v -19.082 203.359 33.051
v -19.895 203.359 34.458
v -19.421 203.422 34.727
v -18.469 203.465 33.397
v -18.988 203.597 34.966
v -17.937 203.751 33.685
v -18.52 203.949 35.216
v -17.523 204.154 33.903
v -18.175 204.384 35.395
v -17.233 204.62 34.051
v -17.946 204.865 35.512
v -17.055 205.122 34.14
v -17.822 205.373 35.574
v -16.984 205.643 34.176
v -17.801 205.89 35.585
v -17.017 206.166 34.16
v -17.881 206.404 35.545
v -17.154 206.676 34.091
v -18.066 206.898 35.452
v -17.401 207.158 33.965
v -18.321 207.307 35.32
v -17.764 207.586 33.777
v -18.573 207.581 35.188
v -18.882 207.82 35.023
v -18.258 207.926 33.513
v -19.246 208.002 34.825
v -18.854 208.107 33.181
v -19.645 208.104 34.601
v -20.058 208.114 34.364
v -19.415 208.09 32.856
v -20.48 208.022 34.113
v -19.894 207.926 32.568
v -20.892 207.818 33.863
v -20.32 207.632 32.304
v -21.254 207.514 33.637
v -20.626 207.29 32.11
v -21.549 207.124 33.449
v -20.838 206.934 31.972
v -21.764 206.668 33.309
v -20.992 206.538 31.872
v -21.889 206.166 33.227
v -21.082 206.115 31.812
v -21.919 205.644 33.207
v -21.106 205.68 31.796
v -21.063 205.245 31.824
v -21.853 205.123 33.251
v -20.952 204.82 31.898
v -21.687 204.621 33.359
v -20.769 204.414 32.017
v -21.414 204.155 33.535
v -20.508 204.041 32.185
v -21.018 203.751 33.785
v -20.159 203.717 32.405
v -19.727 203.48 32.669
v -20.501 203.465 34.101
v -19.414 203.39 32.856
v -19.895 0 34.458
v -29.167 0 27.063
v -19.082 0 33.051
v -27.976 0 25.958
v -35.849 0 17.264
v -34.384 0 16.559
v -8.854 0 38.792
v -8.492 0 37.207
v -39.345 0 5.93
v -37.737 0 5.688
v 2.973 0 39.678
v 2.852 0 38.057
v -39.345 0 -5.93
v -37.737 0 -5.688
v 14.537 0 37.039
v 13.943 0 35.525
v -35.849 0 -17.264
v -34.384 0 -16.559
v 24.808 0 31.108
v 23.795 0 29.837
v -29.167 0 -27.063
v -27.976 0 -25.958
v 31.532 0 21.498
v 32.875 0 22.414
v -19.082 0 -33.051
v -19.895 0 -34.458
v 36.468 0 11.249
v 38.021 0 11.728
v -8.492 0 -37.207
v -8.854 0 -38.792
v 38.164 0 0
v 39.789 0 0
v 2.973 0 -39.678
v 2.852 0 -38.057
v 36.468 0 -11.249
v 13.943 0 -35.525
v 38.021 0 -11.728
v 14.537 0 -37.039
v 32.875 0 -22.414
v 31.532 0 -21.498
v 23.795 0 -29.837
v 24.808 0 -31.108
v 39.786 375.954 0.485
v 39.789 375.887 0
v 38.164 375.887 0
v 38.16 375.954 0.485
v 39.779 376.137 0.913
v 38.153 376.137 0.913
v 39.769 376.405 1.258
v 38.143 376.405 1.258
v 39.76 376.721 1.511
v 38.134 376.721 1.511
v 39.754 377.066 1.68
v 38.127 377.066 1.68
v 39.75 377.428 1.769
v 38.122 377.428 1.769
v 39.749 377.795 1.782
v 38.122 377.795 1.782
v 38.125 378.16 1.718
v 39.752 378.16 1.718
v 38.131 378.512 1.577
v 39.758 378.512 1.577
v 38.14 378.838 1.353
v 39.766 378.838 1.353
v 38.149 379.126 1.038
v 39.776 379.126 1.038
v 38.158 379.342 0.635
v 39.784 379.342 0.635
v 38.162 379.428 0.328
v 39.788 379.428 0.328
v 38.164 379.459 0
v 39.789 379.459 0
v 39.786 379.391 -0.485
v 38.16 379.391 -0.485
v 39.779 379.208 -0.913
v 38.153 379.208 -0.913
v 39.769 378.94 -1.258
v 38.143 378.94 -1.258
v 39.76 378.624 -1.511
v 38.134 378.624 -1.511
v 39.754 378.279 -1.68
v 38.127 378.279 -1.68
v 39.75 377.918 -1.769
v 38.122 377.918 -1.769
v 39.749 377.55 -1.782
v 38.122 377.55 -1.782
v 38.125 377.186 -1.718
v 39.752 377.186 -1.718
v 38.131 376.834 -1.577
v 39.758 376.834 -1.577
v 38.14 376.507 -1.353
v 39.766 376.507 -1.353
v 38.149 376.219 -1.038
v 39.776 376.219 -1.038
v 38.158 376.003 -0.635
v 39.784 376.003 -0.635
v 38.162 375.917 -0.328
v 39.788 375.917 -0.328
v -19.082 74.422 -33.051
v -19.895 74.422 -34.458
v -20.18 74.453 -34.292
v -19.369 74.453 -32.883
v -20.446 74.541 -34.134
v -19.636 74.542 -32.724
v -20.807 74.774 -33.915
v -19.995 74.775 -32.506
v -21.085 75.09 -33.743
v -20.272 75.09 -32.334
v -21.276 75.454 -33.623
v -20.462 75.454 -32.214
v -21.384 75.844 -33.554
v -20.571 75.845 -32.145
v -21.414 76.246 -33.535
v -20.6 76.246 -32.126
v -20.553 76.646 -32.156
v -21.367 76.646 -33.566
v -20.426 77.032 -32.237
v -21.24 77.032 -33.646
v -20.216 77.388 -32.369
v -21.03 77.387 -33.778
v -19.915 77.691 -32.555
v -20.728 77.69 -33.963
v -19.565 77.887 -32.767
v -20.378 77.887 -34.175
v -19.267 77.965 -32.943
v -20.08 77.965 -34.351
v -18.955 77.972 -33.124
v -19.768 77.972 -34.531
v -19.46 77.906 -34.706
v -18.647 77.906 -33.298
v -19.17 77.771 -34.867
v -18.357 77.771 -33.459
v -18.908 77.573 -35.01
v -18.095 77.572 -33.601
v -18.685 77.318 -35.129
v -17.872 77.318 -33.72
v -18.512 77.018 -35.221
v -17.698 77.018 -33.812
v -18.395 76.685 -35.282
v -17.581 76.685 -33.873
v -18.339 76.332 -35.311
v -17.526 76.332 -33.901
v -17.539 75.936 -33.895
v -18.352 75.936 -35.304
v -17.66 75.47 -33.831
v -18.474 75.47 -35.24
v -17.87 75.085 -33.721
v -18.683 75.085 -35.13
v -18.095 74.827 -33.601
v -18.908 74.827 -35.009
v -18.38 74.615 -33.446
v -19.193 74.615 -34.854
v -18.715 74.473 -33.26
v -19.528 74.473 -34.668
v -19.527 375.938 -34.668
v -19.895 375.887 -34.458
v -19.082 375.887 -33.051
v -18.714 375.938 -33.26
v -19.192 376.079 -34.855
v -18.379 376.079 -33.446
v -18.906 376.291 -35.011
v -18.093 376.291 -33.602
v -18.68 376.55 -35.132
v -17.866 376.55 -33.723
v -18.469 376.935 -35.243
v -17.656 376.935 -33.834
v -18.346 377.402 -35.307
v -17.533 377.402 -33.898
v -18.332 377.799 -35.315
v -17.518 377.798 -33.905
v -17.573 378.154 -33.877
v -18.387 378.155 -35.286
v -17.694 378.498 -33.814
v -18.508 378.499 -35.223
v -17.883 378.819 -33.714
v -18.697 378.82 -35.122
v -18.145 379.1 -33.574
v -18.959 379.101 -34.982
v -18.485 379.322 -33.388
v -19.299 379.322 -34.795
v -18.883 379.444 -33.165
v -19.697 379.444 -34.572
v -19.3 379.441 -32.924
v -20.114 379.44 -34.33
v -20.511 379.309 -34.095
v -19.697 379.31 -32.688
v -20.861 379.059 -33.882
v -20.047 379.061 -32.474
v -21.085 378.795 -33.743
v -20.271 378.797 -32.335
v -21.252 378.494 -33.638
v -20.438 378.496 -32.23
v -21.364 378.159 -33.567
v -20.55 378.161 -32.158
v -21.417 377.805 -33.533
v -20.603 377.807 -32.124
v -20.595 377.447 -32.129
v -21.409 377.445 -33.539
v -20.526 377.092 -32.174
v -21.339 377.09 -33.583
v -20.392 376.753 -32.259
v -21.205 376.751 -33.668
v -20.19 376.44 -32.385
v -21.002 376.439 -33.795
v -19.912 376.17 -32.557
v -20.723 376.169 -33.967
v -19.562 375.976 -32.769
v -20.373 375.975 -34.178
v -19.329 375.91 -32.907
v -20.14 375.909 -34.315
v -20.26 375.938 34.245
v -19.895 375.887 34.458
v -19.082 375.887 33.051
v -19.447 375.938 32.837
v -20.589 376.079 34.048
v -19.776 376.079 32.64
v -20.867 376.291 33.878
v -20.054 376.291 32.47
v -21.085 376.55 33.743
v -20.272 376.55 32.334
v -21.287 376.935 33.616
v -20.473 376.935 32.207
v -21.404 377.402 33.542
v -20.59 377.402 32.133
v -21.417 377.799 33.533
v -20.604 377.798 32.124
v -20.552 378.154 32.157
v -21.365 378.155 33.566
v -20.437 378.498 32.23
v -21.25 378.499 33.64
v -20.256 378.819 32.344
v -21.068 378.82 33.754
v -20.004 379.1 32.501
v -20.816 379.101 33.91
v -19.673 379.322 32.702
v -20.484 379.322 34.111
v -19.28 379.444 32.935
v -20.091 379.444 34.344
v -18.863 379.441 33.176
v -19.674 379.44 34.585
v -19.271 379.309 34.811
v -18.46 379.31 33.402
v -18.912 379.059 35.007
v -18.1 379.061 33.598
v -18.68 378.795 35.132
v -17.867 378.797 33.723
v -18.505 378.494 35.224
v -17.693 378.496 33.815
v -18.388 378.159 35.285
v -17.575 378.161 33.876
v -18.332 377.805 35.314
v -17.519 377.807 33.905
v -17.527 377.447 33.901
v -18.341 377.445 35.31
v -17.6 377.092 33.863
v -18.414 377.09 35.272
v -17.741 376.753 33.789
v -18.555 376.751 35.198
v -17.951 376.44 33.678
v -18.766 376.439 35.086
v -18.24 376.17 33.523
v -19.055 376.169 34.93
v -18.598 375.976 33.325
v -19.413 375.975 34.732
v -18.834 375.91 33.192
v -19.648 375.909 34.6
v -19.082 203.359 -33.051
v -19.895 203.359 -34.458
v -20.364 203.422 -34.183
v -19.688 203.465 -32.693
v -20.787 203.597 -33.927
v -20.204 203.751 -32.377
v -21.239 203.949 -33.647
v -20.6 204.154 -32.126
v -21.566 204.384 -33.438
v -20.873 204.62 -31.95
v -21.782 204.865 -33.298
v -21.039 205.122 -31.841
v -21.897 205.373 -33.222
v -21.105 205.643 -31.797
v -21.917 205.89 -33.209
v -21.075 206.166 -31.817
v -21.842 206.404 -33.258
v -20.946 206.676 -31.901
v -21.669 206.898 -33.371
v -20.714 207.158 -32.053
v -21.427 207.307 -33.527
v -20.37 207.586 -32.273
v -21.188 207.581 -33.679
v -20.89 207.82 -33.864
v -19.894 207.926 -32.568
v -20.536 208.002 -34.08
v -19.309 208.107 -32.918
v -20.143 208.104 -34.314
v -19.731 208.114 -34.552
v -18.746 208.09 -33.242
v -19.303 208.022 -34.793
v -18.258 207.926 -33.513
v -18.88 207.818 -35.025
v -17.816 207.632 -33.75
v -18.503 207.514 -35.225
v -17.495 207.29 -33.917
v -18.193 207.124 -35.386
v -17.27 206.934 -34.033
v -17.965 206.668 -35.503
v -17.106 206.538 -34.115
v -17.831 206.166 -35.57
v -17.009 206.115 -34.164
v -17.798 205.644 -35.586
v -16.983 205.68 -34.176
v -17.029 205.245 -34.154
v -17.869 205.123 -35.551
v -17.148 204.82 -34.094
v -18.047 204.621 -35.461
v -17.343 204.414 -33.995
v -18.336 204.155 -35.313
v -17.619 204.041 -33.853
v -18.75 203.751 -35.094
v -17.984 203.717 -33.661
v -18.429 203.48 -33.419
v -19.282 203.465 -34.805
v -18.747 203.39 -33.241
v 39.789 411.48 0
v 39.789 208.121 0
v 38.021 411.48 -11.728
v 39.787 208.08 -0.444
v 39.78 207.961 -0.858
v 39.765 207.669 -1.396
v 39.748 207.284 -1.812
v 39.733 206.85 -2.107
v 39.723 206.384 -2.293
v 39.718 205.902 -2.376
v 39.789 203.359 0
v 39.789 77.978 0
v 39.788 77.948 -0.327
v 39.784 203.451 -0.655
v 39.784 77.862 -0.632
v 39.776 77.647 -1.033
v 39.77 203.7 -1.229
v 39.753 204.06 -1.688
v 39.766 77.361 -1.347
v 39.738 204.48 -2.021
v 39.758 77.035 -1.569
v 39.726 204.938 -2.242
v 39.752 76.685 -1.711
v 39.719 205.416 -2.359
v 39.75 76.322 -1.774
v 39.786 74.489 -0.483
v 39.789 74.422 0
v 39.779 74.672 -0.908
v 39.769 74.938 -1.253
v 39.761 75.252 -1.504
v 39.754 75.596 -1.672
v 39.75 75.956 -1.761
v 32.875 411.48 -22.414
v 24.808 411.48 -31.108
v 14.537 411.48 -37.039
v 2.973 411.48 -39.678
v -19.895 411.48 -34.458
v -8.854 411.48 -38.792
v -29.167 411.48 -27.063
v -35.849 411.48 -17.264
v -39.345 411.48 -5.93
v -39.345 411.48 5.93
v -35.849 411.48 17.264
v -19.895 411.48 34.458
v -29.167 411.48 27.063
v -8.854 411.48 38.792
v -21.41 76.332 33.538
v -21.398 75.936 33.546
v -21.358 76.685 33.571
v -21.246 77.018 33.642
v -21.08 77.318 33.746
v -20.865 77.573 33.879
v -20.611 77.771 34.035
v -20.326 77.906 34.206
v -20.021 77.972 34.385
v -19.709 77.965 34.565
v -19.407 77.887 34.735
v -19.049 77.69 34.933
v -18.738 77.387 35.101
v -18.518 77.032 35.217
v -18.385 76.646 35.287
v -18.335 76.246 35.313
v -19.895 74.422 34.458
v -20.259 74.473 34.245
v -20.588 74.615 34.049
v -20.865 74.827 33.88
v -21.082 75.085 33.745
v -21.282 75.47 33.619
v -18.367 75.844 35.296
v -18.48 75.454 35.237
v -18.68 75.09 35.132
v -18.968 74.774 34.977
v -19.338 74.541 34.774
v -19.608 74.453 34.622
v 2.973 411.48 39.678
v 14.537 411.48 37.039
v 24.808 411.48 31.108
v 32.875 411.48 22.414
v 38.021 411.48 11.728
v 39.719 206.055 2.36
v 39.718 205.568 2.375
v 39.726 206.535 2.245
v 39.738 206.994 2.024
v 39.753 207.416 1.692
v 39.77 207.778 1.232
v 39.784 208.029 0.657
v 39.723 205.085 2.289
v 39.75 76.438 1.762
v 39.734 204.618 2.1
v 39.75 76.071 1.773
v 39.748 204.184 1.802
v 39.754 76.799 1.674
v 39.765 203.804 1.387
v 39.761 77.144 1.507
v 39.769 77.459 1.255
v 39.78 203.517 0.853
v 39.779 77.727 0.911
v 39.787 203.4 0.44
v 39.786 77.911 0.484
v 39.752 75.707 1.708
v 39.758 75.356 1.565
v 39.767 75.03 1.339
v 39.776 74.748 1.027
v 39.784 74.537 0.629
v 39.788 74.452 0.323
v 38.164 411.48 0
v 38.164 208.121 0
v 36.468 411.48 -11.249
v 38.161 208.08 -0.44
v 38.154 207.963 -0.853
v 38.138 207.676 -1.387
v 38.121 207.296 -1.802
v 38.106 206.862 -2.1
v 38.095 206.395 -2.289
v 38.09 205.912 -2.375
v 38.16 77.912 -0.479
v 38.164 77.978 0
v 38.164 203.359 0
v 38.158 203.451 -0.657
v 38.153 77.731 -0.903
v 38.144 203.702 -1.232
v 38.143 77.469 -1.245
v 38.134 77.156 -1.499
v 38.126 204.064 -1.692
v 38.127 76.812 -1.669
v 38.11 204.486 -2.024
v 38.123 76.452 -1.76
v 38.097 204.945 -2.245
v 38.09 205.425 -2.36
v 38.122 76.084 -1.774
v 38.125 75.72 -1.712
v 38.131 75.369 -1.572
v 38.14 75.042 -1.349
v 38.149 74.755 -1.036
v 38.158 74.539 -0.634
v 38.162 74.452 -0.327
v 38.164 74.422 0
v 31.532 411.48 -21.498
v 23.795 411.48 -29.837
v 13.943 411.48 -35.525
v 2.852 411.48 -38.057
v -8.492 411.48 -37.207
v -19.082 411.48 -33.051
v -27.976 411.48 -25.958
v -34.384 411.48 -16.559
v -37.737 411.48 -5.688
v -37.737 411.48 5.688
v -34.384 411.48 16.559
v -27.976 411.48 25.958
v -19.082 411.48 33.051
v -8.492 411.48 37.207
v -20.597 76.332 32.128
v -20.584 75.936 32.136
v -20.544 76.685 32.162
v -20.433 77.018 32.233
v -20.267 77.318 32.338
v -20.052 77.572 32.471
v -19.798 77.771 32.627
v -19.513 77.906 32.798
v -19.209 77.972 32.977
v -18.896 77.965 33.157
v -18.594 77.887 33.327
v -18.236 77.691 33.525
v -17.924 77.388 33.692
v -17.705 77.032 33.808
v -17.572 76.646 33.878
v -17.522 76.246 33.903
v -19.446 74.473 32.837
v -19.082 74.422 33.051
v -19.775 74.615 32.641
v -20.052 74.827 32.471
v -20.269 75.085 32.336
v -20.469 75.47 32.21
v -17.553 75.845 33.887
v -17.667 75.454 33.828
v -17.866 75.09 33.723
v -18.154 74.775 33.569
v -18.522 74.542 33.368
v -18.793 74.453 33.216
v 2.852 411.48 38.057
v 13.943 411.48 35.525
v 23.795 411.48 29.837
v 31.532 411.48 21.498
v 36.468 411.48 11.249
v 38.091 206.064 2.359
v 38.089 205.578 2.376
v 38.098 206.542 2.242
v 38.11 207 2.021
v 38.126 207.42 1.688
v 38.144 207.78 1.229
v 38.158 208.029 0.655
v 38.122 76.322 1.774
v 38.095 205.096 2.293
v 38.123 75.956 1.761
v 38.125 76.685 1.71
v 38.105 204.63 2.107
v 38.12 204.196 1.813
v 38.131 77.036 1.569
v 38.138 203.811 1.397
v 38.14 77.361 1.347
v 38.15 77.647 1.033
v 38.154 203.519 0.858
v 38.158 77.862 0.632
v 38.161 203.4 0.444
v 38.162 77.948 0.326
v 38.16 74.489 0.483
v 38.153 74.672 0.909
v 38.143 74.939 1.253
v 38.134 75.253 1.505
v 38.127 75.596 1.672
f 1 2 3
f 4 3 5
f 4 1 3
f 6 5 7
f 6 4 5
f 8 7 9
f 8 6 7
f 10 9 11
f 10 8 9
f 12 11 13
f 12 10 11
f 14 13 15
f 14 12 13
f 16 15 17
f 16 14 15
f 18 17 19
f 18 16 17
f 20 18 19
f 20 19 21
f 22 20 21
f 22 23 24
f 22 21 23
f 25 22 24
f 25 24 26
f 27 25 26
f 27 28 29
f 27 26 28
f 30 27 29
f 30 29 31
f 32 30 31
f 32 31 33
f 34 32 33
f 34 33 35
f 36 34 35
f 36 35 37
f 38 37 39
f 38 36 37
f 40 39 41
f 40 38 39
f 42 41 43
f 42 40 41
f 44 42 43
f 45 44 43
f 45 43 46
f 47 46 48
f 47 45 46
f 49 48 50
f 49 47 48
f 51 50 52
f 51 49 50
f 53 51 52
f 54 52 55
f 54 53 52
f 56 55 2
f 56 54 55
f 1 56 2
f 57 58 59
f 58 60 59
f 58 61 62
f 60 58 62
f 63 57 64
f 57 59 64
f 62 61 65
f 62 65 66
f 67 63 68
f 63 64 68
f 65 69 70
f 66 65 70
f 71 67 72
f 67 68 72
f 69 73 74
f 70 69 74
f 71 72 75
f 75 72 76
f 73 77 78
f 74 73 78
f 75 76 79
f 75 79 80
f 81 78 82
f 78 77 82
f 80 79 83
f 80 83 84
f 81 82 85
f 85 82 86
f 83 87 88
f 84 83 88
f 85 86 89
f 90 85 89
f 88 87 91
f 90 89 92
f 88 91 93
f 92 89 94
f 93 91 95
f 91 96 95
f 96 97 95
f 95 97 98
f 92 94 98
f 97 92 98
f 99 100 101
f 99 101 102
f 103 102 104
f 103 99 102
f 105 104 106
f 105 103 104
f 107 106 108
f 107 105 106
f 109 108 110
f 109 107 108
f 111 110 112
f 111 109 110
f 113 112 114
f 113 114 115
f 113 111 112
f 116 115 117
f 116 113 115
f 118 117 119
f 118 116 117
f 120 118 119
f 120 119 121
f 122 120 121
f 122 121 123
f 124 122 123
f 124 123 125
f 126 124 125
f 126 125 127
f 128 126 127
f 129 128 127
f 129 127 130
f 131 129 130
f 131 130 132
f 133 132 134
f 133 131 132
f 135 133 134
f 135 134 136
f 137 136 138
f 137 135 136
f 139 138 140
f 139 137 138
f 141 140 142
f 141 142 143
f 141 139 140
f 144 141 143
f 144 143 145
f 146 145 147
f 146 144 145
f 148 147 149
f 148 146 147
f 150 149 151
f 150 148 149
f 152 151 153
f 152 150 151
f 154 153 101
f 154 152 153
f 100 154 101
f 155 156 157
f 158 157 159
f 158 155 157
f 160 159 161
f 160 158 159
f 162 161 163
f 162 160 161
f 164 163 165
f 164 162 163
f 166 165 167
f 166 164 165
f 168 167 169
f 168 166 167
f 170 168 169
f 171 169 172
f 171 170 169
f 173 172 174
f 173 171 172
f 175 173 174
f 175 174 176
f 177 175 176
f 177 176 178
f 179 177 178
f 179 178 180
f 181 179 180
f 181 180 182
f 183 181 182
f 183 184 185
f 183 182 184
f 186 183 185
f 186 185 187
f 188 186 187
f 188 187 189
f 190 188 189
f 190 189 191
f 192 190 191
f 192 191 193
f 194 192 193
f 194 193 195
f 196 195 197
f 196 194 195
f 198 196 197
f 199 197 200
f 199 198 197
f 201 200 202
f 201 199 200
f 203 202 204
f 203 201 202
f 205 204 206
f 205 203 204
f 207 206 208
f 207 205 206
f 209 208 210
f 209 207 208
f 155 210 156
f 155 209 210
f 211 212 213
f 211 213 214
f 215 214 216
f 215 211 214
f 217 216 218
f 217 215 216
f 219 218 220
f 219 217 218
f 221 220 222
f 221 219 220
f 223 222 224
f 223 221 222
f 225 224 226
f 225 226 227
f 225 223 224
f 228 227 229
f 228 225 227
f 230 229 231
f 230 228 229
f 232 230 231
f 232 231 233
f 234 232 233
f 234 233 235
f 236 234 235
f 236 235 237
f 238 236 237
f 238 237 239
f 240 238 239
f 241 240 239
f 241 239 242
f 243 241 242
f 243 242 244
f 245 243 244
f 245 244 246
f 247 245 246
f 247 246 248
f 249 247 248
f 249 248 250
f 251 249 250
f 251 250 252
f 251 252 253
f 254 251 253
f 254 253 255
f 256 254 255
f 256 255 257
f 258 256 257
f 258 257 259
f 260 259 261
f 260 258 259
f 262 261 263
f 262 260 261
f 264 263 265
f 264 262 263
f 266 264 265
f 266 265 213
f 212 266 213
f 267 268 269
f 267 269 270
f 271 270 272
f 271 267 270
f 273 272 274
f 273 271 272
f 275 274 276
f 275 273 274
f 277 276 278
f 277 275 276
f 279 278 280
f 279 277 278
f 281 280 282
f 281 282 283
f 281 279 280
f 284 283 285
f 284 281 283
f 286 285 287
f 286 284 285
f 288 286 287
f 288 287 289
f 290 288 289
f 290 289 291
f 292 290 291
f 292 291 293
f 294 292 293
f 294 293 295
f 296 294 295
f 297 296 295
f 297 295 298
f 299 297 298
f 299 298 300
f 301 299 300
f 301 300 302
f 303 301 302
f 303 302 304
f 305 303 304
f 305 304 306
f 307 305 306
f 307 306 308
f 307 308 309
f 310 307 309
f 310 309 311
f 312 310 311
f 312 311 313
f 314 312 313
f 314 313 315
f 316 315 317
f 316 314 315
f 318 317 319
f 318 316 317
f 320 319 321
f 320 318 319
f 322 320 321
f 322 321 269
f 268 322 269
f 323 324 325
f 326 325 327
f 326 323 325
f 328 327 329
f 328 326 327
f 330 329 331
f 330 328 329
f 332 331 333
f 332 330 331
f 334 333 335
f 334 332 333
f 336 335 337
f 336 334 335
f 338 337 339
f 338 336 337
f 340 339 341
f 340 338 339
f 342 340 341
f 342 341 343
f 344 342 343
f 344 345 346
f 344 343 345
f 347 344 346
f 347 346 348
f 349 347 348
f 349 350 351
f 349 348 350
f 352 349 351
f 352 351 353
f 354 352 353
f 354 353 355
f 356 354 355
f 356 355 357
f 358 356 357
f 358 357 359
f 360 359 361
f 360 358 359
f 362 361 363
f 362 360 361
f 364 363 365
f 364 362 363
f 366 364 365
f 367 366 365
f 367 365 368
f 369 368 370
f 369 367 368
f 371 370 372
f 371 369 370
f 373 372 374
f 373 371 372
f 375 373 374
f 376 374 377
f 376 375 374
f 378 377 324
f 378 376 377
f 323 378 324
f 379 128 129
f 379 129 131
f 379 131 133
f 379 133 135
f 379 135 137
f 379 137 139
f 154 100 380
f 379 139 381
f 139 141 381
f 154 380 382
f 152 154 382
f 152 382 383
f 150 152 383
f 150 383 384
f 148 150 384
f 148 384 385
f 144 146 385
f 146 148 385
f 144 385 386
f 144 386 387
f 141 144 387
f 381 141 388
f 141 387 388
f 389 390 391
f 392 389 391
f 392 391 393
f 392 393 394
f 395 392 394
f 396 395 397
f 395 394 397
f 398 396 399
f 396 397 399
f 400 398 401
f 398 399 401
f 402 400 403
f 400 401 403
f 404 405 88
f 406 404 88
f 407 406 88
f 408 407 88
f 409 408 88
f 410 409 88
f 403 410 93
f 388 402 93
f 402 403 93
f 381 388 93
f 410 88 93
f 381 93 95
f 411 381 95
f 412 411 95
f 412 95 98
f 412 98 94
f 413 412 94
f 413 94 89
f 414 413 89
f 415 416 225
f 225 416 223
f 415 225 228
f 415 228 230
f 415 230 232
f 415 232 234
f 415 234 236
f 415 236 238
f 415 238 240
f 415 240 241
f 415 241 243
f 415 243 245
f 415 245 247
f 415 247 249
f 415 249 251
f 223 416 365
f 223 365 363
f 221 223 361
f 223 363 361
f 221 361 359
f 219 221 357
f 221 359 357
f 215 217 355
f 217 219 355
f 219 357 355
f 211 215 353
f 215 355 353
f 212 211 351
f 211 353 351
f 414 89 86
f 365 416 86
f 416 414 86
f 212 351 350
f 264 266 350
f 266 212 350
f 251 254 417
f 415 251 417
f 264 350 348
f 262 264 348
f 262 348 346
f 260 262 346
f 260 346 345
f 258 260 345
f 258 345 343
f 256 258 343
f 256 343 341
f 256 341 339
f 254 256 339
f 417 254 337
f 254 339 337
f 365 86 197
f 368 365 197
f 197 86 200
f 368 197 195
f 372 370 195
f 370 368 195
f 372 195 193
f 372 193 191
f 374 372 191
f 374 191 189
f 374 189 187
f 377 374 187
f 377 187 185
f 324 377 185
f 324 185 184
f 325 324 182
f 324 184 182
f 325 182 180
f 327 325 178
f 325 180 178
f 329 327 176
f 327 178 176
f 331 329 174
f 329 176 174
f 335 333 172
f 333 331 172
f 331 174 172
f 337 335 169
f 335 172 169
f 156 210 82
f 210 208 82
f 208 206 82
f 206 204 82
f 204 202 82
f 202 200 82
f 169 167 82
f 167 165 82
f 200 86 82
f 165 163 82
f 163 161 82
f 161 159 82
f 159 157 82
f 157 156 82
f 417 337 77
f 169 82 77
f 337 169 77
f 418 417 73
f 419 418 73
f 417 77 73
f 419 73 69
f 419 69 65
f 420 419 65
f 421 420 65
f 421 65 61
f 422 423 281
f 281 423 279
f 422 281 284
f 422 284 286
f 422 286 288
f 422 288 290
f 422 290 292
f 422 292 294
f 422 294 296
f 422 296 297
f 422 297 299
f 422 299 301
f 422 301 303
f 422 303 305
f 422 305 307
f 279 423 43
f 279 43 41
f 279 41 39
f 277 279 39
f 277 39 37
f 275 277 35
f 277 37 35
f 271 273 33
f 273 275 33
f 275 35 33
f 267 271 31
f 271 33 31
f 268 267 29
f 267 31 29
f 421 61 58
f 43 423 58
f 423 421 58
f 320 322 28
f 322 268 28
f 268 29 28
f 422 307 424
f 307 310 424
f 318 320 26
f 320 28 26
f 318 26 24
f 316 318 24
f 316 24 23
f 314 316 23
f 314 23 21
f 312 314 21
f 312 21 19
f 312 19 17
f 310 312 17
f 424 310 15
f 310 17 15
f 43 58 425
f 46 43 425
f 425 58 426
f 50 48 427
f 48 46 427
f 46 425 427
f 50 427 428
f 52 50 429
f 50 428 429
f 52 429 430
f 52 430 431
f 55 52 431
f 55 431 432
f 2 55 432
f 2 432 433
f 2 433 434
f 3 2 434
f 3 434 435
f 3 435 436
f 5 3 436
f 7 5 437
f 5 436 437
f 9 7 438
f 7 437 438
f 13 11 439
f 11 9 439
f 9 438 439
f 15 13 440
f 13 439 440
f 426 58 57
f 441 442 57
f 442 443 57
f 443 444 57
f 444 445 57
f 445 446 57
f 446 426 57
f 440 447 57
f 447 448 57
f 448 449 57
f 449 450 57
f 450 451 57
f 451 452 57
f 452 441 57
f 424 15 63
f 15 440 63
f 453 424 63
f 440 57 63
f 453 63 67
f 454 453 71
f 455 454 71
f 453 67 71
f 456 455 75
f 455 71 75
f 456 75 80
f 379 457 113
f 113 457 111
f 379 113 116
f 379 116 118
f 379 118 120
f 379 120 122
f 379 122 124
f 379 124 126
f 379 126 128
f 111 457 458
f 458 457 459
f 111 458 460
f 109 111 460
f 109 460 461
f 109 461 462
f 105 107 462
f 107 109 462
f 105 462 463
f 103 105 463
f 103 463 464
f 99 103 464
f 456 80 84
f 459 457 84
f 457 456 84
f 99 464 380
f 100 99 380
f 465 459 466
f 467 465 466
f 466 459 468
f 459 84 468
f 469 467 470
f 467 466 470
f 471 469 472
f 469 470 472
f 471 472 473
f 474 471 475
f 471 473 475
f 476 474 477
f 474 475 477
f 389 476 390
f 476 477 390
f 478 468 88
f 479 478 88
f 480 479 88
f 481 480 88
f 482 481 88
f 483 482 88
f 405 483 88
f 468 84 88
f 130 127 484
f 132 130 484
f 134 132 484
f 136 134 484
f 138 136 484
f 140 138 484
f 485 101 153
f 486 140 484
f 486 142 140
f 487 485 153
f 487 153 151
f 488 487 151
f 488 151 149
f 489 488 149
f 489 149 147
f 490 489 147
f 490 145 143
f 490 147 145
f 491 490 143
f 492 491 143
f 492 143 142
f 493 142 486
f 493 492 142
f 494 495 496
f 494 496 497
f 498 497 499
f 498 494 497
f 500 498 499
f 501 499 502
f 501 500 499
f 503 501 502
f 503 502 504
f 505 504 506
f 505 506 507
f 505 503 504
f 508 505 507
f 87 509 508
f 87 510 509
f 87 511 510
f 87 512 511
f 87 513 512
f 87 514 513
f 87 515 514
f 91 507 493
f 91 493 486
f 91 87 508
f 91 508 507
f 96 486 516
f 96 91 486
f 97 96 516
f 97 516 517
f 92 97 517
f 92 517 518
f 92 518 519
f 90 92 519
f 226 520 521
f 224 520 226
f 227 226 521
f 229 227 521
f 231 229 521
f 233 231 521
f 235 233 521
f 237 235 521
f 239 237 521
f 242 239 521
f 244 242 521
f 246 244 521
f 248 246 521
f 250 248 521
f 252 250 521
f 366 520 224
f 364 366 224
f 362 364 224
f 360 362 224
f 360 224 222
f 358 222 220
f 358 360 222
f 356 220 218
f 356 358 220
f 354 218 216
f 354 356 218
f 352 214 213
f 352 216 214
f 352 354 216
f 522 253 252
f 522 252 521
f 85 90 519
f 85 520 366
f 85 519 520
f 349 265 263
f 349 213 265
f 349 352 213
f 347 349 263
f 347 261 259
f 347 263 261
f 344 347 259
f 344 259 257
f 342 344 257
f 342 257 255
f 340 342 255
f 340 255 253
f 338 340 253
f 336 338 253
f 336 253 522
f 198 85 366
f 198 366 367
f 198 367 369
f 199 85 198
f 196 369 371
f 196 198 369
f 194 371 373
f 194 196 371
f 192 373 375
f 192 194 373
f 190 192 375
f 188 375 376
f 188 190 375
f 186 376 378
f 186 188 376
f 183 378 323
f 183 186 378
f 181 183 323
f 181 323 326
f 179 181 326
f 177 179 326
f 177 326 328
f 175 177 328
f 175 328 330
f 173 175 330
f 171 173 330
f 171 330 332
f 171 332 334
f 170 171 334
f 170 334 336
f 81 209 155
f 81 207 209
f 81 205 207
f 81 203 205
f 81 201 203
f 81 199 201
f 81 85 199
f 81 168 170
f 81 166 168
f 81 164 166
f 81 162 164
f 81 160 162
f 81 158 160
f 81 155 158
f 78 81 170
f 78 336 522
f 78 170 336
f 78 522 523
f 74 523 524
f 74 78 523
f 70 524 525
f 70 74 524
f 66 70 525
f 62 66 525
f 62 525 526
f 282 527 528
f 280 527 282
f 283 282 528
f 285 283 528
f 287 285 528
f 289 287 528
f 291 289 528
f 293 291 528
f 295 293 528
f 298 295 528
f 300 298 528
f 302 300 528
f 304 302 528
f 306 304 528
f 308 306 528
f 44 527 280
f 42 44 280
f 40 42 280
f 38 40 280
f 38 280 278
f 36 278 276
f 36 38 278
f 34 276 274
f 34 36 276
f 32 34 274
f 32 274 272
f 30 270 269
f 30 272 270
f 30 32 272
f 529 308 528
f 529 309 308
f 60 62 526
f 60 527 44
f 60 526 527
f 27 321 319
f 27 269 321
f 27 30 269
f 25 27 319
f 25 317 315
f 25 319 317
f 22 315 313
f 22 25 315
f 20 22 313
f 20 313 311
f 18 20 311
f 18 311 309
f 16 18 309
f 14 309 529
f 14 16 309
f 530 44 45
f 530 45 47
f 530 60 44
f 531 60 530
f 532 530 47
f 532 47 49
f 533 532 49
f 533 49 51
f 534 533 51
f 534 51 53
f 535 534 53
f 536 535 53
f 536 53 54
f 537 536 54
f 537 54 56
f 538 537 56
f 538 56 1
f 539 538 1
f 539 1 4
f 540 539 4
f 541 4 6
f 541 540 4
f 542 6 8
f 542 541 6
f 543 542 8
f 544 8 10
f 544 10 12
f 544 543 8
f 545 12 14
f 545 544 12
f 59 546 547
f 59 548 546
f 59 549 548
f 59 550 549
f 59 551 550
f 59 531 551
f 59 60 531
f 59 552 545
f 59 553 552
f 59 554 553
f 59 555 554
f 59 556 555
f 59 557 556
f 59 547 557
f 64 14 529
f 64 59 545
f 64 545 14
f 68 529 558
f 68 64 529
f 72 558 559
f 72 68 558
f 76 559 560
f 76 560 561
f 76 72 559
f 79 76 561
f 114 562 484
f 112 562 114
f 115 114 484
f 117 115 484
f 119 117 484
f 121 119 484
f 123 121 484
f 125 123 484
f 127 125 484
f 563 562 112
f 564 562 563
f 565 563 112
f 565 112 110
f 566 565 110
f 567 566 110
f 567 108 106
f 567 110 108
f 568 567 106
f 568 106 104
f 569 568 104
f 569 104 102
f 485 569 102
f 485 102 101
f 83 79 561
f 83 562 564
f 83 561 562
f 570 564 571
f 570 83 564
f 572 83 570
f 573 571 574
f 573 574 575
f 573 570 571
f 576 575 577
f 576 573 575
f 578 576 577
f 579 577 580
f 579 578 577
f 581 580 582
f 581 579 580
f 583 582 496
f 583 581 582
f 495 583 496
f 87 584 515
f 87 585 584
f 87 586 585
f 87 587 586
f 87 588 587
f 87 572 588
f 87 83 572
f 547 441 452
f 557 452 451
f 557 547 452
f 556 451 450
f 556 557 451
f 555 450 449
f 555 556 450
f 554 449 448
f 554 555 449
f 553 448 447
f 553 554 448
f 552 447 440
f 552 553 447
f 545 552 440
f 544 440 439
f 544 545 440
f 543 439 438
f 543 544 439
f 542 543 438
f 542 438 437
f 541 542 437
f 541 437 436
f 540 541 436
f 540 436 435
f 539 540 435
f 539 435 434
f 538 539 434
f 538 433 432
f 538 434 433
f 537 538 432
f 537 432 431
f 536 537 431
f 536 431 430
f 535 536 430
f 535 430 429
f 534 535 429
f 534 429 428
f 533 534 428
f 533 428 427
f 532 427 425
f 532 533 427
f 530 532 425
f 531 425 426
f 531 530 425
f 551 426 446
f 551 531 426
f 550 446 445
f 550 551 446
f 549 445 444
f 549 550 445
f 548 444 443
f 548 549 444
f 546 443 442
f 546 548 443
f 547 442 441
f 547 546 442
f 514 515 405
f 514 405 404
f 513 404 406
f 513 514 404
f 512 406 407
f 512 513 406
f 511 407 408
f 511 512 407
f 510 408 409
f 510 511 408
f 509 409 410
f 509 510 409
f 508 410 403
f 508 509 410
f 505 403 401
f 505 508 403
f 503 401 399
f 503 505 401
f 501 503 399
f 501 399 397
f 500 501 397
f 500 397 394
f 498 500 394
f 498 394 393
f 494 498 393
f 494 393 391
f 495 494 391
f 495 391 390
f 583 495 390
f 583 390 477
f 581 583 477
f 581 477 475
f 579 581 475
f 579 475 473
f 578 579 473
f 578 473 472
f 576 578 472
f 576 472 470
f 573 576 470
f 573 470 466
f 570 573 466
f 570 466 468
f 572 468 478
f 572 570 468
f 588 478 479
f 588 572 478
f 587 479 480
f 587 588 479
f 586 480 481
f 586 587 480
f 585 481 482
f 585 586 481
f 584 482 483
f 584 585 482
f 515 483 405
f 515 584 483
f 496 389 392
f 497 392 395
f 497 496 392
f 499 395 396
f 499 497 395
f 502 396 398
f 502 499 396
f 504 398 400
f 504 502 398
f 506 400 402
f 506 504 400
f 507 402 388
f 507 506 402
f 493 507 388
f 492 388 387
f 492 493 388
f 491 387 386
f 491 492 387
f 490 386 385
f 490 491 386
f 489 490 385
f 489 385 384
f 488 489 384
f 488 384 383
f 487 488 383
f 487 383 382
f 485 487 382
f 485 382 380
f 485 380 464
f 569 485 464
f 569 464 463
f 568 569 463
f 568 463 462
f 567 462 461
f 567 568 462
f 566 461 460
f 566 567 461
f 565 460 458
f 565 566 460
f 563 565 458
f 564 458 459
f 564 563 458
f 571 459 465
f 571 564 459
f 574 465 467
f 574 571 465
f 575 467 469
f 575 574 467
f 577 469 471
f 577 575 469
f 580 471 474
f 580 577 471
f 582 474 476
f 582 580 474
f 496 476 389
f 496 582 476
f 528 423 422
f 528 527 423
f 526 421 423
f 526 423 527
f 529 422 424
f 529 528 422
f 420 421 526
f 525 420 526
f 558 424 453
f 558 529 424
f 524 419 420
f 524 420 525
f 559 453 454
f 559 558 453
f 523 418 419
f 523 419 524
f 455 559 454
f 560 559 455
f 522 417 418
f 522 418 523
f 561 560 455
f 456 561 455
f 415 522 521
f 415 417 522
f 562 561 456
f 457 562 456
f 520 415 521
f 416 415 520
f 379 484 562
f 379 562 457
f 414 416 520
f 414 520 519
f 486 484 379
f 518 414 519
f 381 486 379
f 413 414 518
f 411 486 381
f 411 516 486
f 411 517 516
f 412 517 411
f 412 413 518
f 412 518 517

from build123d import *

# Parameters (mm, degrees)
SKETCH1_R                        = 39.7891
SKETCH1_R_2                      = 38.1635
BOSS_EXTRUDE1_DEPTH              = 411.48
CUT_EXTRUDE1_START               = -1.66704
SKETCH2_R                        = 1.778
CUT_EXTRUDE1_DEPTH               = 1.66704
CIRPATTERN1_COUNT                = 3
PRESSURE_START                   = -1.699963
SKETCH3_R                        = 2.38125
PRESSURE_EQUALIZATION_HOLE_DEPTH = 1.699963
CIRPATTERN2_COUNT                = 3
SKETCH4_R                        = 1.7859375
CUT_EXTRUDE3_DEPTH               = 1.667411
CIRPATTERN3_COUNT                = 3


with BuildPart() as part:
    # Sketch1 → Boss-Extrude1 (new body)
    with BuildSketch(Plane(origin=(0, 0, 0), x_dir=(1, 0, 0), z_dir=(0, 1, 0))):
        Circle(SKETCH1_R)
        Circle(SKETCH1_R_2, mode=Mode.SUBTRACT)
    extrude(amount=BOSS_EXTRUDE1_DEPTH)

    # Sketch2 → Cut-Extrude1 (cut)
    with BuildSketch(Plane(origin=(-19.89455, 0, 34.458371394), x_dir=(0, -1, 0), z_dir=(-0.5, 0, 0.866025404)).offset(CUT_EXTRUDE1_START)):
        with Locations((-76.2, 0)):
            Circle(SKETCH2_R)
    cut_extrude1 = extrude(amount=CUT_EXTRUDE1_DEPTH, mode=Mode.SUBTRACT)

    # CirPattern1: Cut-Extrude1 ×3 about axis
    cirpattern1_axis = Axis((0, -7.62, 0), (0, 1, 0))
    for i in range(1, CIRPATTERN1_COUNT):
        add(cut_extrude1.rotate(cirpattern1_axis, i * 360 / CIRPATTERN1_COUNT), mode=Mode.SUBTRACT)

    # Sketch3 → Pressure Equalization Hole (cut)
    with BuildSketch(Plane(origin=(-19.89455, 0, 34.458371394), x_dir=(0, -1, 0), z_dir=(-0.5, 0, 0.866025404)).offset(PRESSURE_START)):
        with Locations((-205.74, 0)):
            Circle(SKETCH3_R)
    pressure_equalization_hole = extrude(amount=PRESSURE_EQUALIZATION_HOLE_DEPTH, mode=Mode.SUBTRACT)

    # CirPattern2: Pressure Equalization Hole ×3 about axis
    cirpattern2_axis = Axis((0, -7.62, 0), (0, 1, 0))
    for i in range(1, CIRPATTERN2_COUNT):
        add(pressure_equalization_hole.rotate(cirpattern2_axis, i * 360 / CIRPATTERN2_COUNT), mode=Mode.SUBTRACT)

    # Sketch4 → Cut-Extrude3 (cut)
    with BuildSketch(Plane(origin=(39.7891, 0, 0), x_dir=(0, -1, 0), z_dir=(-1, 0, 0))):
        with Locations((-377.6726, 0)):
            Circle(SKETCH4_R)
    cut_extrude3 = extrude(amount=CUT_EXTRUDE3_DEPTH, mode=Mode.SUBTRACT)

    # CirPattern3: Cut-Extrude3 ×3 about axis
    cirpattern3_axis = Axis((0, -7.62, 0), (0, 1, 0))
    for i in range(1, CIRPATTERN3_COUNT):
        add(cut_extrude3.rotate(cirpattern3_axis, i * 360 / CIRPATTERN3_COUNT), mode=Mode.SUBTRACT)


solid = part.part
